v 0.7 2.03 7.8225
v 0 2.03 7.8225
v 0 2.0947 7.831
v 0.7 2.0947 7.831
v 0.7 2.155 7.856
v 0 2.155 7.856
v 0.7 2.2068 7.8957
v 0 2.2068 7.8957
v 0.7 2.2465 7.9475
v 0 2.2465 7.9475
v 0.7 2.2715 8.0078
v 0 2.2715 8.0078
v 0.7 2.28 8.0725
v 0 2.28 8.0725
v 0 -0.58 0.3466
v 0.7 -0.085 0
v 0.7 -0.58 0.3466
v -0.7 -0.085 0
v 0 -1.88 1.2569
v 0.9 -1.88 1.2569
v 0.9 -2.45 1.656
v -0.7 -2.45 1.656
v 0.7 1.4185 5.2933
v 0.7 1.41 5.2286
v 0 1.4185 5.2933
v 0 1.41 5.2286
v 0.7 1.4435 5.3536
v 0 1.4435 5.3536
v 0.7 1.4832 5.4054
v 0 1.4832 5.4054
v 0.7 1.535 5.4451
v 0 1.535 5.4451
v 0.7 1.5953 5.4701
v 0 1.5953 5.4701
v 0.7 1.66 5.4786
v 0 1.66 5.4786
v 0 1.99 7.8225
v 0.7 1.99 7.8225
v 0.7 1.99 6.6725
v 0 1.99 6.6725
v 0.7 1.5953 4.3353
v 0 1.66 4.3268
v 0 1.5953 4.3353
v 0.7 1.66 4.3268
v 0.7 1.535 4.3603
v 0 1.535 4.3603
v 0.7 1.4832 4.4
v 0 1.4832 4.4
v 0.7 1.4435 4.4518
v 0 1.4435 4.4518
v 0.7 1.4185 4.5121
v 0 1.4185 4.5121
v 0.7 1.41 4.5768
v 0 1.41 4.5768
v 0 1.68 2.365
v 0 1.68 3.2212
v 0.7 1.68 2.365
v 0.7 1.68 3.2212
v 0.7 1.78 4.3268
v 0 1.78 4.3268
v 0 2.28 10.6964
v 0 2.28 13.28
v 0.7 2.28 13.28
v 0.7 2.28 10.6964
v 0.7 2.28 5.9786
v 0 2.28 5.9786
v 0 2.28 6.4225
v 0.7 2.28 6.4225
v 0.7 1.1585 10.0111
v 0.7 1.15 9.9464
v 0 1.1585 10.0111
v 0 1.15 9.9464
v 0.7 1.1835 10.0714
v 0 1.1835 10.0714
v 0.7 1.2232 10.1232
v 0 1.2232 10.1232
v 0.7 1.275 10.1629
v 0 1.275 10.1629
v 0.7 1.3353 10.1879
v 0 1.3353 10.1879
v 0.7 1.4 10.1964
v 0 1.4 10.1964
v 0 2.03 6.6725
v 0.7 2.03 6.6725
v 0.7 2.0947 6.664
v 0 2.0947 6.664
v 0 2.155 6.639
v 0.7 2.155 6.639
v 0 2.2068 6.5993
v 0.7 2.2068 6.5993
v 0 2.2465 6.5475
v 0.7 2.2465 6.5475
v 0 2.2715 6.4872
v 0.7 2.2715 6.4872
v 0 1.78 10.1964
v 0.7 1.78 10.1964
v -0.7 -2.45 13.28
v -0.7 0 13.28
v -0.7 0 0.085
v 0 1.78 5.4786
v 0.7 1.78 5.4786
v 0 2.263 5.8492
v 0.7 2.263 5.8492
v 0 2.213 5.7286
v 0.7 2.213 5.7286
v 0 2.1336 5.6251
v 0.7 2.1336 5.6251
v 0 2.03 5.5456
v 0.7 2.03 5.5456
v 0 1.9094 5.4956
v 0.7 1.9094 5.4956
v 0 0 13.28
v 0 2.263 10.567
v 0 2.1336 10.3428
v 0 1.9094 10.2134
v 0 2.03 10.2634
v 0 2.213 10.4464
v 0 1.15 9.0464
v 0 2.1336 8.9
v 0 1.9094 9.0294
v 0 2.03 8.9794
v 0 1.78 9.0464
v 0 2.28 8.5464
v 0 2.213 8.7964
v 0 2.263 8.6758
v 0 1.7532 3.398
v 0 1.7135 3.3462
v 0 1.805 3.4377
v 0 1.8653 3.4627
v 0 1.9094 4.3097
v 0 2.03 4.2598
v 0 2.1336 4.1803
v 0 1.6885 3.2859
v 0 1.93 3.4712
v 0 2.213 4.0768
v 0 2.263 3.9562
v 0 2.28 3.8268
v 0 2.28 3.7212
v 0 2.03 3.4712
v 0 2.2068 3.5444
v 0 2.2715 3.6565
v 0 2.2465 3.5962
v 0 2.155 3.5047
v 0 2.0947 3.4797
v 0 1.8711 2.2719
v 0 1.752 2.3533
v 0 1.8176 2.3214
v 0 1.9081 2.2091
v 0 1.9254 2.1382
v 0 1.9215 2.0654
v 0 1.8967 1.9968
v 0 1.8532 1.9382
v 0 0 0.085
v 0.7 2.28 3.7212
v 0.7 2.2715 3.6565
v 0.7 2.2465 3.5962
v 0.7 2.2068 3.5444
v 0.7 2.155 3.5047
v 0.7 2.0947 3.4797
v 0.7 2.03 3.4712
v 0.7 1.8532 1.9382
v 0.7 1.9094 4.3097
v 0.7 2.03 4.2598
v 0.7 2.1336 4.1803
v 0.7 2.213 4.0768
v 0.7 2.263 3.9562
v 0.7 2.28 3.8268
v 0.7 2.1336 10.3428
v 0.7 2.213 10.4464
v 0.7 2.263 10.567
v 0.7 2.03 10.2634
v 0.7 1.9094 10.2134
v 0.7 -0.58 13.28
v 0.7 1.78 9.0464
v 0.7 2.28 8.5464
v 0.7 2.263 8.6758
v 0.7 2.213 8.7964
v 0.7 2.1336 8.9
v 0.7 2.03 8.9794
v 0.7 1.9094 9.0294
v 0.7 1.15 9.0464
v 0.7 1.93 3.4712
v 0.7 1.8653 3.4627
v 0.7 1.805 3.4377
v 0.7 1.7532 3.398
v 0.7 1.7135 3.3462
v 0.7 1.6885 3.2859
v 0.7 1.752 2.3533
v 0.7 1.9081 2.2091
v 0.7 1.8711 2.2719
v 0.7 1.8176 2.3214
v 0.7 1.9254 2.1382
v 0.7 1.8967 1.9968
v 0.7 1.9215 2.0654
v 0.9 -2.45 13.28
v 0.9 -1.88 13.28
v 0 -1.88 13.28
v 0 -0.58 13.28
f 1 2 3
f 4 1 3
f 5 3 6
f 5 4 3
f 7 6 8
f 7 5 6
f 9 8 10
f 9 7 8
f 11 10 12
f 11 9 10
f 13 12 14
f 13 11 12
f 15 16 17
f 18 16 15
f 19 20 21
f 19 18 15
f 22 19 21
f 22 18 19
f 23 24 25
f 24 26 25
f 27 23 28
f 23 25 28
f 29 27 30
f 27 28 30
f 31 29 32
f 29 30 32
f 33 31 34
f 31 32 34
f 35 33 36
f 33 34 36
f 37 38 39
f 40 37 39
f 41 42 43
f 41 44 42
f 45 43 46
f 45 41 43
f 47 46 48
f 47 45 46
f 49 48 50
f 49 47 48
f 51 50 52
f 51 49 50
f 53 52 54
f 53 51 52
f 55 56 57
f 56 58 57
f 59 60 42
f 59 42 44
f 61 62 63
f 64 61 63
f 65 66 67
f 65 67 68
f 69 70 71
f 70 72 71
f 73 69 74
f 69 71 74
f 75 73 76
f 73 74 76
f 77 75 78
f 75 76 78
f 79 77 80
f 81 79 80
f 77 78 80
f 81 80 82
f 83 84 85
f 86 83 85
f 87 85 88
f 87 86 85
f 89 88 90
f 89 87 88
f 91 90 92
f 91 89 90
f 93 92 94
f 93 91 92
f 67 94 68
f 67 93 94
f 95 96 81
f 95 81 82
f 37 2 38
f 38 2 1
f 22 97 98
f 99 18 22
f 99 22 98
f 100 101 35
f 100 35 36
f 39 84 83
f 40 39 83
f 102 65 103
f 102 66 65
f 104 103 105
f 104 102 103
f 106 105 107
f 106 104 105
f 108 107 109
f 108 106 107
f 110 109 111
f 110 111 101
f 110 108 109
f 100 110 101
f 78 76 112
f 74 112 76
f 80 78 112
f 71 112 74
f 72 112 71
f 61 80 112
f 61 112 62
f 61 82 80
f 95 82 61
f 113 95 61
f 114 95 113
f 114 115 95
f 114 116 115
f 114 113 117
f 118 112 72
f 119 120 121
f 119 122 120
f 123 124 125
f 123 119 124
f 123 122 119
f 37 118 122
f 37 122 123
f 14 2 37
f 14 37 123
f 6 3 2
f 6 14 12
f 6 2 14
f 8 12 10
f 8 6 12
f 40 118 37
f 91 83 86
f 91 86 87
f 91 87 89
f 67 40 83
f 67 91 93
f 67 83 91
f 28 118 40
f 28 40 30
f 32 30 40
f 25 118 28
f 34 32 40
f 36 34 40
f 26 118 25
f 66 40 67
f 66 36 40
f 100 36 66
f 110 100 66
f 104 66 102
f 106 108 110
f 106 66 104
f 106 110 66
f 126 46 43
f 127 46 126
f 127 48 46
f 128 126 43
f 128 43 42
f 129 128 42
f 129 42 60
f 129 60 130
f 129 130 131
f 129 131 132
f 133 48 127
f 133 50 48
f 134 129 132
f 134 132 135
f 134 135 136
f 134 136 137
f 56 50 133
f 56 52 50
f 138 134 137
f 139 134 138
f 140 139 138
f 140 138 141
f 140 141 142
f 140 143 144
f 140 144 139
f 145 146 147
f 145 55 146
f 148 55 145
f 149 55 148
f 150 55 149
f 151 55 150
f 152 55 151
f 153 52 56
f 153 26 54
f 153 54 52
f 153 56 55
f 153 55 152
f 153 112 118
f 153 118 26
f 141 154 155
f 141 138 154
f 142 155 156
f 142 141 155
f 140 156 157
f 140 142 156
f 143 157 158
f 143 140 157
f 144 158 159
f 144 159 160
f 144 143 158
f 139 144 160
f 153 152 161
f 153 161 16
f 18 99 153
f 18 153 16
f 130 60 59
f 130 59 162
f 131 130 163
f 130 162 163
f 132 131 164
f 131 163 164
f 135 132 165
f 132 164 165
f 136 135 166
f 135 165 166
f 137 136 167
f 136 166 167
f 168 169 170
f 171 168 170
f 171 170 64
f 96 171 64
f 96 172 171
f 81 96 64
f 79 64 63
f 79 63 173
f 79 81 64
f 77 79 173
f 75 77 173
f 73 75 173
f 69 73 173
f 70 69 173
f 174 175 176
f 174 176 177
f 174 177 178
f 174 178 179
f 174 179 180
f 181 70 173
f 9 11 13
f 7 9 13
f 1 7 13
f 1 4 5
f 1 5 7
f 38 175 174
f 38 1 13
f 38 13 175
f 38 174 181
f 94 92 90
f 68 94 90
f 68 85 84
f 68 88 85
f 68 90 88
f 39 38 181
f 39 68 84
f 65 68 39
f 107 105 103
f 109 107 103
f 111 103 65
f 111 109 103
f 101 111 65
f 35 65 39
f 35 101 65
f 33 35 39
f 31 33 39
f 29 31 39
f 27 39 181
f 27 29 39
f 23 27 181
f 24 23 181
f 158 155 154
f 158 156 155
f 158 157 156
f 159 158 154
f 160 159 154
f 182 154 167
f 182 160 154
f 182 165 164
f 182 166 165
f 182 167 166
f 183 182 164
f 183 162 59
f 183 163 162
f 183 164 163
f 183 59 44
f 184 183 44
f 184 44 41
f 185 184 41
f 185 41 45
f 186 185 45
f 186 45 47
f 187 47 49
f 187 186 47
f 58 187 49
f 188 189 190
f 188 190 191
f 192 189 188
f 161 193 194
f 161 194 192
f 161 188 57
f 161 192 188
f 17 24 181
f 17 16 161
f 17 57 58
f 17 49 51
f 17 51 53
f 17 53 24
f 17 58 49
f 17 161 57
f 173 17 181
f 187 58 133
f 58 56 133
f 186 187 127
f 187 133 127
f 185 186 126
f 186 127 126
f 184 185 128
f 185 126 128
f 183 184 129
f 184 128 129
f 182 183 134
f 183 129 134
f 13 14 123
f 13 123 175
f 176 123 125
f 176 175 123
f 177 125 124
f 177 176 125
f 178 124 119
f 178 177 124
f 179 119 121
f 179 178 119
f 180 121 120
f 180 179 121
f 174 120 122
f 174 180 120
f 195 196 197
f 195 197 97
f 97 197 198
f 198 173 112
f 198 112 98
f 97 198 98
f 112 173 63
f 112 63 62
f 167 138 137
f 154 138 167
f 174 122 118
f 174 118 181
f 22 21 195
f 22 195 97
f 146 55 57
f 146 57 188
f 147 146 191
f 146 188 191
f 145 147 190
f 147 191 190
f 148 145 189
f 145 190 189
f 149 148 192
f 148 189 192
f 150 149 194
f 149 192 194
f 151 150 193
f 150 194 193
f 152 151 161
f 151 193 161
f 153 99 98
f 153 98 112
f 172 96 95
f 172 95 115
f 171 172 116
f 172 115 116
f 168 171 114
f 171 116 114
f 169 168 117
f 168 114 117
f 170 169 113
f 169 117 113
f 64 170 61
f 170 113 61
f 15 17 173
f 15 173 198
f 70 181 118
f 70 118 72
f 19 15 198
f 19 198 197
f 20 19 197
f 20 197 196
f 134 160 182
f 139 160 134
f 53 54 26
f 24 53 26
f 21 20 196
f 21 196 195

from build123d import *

# Parameters (mm, degrees)
BOSS_EXTRUDE1_DEPTH     = 13.28
CUT_EXTRUDE1_DEPTH      = 14.53406443
CUT_EXTRUDE1_DEPTH_BACK = 14.53406443
CUT_EXTRUDE5_DEPTH      = 0.29
CUT_EXTRUDE6_DEPTH      = 1.13
CUT_EXTRUDE7_DEPTH      = 0.87
CUT_EXTRUDE8_DEPTH      = 0.6
FILLET7_R               = 0.5
FILLET8_R               = 0.5
FILLET13_R              = 0.25
FILLET14_R              = 0.25
FILLET15_R              = 0.5
FILLET16_R              = 0.5
FILLET18_R              = 0.25
FILLET19_R              = 0.25
FILLET20_R              = 0.25
FILLET21_R              = 0.25
FILLET23_R              = 0.25
FILLET25_R              = 0.25


with BuildPart() as part:
    # Sketch1 → Boss-Extrude1 (new body)
    with BuildSketch(Plane.XY):
        Polygon((0, 0), (0, 2.28), (0.7, 2.28), (0.7, -0.58), (0, -0.58), (0, -1.88), (0.9, -1.88), (0.9, -2.45), (-0.7, -2.45), (-0.7, 0), align=None)
    extrude(amount=BOSS_EXTRUDE1_DEPTH)

    # Sketch2 → Cut-Extrude1 (cut, two sides: drawn at the far end of the back side and taken through both)
    with BuildSketch(Plane(origin=(0, 0, 0), x_dir=(0, 0, -1), z_dir=(1, 0, 0)).offset(-CUT_EXTRUDE1_DEPTH_BACK)):
        Polygon((0.8, -2.75), (0.8, -0.085), (0.8, 2.58), (-2.665, 2.58), (0, -0.085), (-1.866053089, -2.75), align=None)
    extrude(amount=CUT_EXTRUDE1_DEPTH + CUT_EXTRUDE1_DEPTH_BACK, mode=Mode.SUBTRACT)

    # 3DSketch1 → Cut-Extrude5 (cut)
    with BuildSketch(Plane(origin=(0.7, 2.28, 7.8225), x_dir=(-0.5199469468957453, 0, -0.8541985556144386), z_dir=(0, 1, 0))):
        Polygon((0, 0), (0.982328339, -0.597938989), (1.346291202, 0), (0.363962863, 0.597938989), align=None)
    extrude(amount=-CUT_EXTRUDE5_DEPTH, mode=Mode.SUBTRACT)

    # 3DSketch1<3> → Cut-Extrude6 (cut)
    with BuildSketch(Plane(origin=(0, 2.28, 10.196397445), x_dir=(0.5199469468957453, 0, -0.8541985556144386), z_dir=(0, 1, 0))):
        Polygon((0, 0), (0.982328339, 0.597938989), (1.346291202, 0), (0.363962863, -0.597938989), align=None)
    extrude(amount=-CUT_EXTRUDE6_DEPTH, mode=Mode.SUBTRACT)

    # 3DSketch1<4> → Cut-Extrude7 (cut)
    with BuildSketch(Plane(origin=(0, 2.28, 5.478611146), x_dir=(0.519345577670118, 0, -0.8545643164528294), z_dir=(0, 1, 0))):
        Polygon((0, 0), (0.984308217, 0.598195022), (1.347850122, 0), (0.363541904, -0.598195022), align=None)
    extrude(amount=-CUT_EXTRUDE7_DEPTH, mode=Mode.SUBTRACT)

    # 3DSketch1<5> → Cut-Extrude8 (cut)
    with BuildSketch(Plane(origin=(0, 2.28, 10.196397445), x_dir=(0.08902885316147792, 0, -0.9960290474201804), z_dir=(0, -1, 0))):
        Polygon((0, 0), (1.145433405, -0.102383181), (1.207753602, 0.594837152), (0.062320197, 0.697220333), align=None)
        Polygon((4.699052194, -0.420019104), (5.846302971, -0.522564728), (5.908623168, 0.174655605), (4.761372391, 0.277201229), align=None)
        Polygon((6.698507562, -0.598738006), (7.800299337, -0.697220333), (7.862619534, 0), (6.760827759, 0.098482327), align=None)
    extrude(amount=CUT_EXTRUDE8_DEPTH, mode=Mode.SUBTRACT)

    # Fillet7
    fillet7_edges = [part.edges().sort_by_distance(p)[0] for p in [
        (0.35, 2.28, 9.046397445),
    ]]
    fillet(fillet7_edges, radius=FILLET7_R)

    # Fillet8
    fillet8_edges = [part.edges().sort_by_distance(p)[0] for p in [
        (0.35, 2.28, 10.196397445),
    ]]
    fillet(fillet8_edges, radius=FILLET8_R)

    # Fillet13
    fillet13_edges = [part.edges().sort_by_distance(p)[0] for p in [
        (0.35, 2.28, 6.6725),
    ]]
    fillet(fillet13_edges, radius=FILLET13_R)

    # Fillet14
    fillet14_edges = [part.edges().sort_by_distance(p)[0] for p in [
        (0.35, 2.28, 7.8225),
    ]]
    fillet(fillet14_edges, radius=FILLET14_R)

    # Fillet15
    fillet15_edges = [part.edges().sort_by_distance(p)[0] for p in [
        (0.35, 2.28, 5.478611146),
    ]]
    fillet(fillet15_edges, radius=FILLET15_R)

    # Fillet16
    fillet16_edges = [part.edges().sort_by_distance(p)[0] for p in [
        (0.35, 2.28, 4.326786528),
    ]]
    fillet(fillet16_edges, radius=FILLET16_R)

    # Fillet18
    fillet18_edges = [part.edges().sort_by_distance(p)[0] for p in [
        (0.35, 2.28, 3.471184381),
    ]]
    fillet(fillet18_edges, radius=FILLET18_R)

    # Fillet19
    # the kernel refuses this fillet: 0.25 mm, written as the material it takes off along each edge
    with BuildSketch(Plane(origin=(2.208795436, 2.28, 2.365), x_dir=(0, -1, 0), z_dir=(-1, 0, 0))) as fillet19_piece_1:
        with BuildLine():
            CenterArc((0.603528489, -0.249975098), FILLET19_R, 90.808696936, 134.191303064)
            Line((0.426751794, -0.426751794), (0.42321626, -0.430287327))
            Line((0.42321626, -0.430287327), (-0.003535534, -0.003535534))
            Line((-0.003535534, -0.003535534), (0, 0.005))
            ThreePointArc((0, 0.005), (0.3, 0.005), (0.59992943, 0.004999502))
            Line((0.59992943, 0.004999502), (0.6, 0))
        make_face()
    extrude(amount=3.717590871, mode=Mode.SUBTRACT)

    # Fillet20
    fillet20_edges = [part.edges().sort_by_distance(p)[0] for p in [
        (0.35, 1.68, 3.471184381),
    ]]
    fillet(fillet20_edges, radius=FILLET20_R)

    # Fillet21
    fillet21_edges = [part.edges().sort_by_distance(p)[0] for p in [
        (0.35, 1.41, 4.326786528),
    ]]
    fillet(fillet21_edges, radius=FILLET21_R)

    # Fillet23
    fillet23_edges = [part.edges().sort_by_distance(p)[0] for p in [
        (0.35, 1.41, 5.478611146),
    ]]
    fillet(fillet23_edges, radius=FILLET23_R)

    # Fillet25
    fillet25_edges = [part.edges().sort_by_distance(p)[0] for p in [
        (0.35, 1.15, 10.196397445),
    ]]
    fillet(fillet25_edges, radius=FILLET25_R)


solid = part.part
